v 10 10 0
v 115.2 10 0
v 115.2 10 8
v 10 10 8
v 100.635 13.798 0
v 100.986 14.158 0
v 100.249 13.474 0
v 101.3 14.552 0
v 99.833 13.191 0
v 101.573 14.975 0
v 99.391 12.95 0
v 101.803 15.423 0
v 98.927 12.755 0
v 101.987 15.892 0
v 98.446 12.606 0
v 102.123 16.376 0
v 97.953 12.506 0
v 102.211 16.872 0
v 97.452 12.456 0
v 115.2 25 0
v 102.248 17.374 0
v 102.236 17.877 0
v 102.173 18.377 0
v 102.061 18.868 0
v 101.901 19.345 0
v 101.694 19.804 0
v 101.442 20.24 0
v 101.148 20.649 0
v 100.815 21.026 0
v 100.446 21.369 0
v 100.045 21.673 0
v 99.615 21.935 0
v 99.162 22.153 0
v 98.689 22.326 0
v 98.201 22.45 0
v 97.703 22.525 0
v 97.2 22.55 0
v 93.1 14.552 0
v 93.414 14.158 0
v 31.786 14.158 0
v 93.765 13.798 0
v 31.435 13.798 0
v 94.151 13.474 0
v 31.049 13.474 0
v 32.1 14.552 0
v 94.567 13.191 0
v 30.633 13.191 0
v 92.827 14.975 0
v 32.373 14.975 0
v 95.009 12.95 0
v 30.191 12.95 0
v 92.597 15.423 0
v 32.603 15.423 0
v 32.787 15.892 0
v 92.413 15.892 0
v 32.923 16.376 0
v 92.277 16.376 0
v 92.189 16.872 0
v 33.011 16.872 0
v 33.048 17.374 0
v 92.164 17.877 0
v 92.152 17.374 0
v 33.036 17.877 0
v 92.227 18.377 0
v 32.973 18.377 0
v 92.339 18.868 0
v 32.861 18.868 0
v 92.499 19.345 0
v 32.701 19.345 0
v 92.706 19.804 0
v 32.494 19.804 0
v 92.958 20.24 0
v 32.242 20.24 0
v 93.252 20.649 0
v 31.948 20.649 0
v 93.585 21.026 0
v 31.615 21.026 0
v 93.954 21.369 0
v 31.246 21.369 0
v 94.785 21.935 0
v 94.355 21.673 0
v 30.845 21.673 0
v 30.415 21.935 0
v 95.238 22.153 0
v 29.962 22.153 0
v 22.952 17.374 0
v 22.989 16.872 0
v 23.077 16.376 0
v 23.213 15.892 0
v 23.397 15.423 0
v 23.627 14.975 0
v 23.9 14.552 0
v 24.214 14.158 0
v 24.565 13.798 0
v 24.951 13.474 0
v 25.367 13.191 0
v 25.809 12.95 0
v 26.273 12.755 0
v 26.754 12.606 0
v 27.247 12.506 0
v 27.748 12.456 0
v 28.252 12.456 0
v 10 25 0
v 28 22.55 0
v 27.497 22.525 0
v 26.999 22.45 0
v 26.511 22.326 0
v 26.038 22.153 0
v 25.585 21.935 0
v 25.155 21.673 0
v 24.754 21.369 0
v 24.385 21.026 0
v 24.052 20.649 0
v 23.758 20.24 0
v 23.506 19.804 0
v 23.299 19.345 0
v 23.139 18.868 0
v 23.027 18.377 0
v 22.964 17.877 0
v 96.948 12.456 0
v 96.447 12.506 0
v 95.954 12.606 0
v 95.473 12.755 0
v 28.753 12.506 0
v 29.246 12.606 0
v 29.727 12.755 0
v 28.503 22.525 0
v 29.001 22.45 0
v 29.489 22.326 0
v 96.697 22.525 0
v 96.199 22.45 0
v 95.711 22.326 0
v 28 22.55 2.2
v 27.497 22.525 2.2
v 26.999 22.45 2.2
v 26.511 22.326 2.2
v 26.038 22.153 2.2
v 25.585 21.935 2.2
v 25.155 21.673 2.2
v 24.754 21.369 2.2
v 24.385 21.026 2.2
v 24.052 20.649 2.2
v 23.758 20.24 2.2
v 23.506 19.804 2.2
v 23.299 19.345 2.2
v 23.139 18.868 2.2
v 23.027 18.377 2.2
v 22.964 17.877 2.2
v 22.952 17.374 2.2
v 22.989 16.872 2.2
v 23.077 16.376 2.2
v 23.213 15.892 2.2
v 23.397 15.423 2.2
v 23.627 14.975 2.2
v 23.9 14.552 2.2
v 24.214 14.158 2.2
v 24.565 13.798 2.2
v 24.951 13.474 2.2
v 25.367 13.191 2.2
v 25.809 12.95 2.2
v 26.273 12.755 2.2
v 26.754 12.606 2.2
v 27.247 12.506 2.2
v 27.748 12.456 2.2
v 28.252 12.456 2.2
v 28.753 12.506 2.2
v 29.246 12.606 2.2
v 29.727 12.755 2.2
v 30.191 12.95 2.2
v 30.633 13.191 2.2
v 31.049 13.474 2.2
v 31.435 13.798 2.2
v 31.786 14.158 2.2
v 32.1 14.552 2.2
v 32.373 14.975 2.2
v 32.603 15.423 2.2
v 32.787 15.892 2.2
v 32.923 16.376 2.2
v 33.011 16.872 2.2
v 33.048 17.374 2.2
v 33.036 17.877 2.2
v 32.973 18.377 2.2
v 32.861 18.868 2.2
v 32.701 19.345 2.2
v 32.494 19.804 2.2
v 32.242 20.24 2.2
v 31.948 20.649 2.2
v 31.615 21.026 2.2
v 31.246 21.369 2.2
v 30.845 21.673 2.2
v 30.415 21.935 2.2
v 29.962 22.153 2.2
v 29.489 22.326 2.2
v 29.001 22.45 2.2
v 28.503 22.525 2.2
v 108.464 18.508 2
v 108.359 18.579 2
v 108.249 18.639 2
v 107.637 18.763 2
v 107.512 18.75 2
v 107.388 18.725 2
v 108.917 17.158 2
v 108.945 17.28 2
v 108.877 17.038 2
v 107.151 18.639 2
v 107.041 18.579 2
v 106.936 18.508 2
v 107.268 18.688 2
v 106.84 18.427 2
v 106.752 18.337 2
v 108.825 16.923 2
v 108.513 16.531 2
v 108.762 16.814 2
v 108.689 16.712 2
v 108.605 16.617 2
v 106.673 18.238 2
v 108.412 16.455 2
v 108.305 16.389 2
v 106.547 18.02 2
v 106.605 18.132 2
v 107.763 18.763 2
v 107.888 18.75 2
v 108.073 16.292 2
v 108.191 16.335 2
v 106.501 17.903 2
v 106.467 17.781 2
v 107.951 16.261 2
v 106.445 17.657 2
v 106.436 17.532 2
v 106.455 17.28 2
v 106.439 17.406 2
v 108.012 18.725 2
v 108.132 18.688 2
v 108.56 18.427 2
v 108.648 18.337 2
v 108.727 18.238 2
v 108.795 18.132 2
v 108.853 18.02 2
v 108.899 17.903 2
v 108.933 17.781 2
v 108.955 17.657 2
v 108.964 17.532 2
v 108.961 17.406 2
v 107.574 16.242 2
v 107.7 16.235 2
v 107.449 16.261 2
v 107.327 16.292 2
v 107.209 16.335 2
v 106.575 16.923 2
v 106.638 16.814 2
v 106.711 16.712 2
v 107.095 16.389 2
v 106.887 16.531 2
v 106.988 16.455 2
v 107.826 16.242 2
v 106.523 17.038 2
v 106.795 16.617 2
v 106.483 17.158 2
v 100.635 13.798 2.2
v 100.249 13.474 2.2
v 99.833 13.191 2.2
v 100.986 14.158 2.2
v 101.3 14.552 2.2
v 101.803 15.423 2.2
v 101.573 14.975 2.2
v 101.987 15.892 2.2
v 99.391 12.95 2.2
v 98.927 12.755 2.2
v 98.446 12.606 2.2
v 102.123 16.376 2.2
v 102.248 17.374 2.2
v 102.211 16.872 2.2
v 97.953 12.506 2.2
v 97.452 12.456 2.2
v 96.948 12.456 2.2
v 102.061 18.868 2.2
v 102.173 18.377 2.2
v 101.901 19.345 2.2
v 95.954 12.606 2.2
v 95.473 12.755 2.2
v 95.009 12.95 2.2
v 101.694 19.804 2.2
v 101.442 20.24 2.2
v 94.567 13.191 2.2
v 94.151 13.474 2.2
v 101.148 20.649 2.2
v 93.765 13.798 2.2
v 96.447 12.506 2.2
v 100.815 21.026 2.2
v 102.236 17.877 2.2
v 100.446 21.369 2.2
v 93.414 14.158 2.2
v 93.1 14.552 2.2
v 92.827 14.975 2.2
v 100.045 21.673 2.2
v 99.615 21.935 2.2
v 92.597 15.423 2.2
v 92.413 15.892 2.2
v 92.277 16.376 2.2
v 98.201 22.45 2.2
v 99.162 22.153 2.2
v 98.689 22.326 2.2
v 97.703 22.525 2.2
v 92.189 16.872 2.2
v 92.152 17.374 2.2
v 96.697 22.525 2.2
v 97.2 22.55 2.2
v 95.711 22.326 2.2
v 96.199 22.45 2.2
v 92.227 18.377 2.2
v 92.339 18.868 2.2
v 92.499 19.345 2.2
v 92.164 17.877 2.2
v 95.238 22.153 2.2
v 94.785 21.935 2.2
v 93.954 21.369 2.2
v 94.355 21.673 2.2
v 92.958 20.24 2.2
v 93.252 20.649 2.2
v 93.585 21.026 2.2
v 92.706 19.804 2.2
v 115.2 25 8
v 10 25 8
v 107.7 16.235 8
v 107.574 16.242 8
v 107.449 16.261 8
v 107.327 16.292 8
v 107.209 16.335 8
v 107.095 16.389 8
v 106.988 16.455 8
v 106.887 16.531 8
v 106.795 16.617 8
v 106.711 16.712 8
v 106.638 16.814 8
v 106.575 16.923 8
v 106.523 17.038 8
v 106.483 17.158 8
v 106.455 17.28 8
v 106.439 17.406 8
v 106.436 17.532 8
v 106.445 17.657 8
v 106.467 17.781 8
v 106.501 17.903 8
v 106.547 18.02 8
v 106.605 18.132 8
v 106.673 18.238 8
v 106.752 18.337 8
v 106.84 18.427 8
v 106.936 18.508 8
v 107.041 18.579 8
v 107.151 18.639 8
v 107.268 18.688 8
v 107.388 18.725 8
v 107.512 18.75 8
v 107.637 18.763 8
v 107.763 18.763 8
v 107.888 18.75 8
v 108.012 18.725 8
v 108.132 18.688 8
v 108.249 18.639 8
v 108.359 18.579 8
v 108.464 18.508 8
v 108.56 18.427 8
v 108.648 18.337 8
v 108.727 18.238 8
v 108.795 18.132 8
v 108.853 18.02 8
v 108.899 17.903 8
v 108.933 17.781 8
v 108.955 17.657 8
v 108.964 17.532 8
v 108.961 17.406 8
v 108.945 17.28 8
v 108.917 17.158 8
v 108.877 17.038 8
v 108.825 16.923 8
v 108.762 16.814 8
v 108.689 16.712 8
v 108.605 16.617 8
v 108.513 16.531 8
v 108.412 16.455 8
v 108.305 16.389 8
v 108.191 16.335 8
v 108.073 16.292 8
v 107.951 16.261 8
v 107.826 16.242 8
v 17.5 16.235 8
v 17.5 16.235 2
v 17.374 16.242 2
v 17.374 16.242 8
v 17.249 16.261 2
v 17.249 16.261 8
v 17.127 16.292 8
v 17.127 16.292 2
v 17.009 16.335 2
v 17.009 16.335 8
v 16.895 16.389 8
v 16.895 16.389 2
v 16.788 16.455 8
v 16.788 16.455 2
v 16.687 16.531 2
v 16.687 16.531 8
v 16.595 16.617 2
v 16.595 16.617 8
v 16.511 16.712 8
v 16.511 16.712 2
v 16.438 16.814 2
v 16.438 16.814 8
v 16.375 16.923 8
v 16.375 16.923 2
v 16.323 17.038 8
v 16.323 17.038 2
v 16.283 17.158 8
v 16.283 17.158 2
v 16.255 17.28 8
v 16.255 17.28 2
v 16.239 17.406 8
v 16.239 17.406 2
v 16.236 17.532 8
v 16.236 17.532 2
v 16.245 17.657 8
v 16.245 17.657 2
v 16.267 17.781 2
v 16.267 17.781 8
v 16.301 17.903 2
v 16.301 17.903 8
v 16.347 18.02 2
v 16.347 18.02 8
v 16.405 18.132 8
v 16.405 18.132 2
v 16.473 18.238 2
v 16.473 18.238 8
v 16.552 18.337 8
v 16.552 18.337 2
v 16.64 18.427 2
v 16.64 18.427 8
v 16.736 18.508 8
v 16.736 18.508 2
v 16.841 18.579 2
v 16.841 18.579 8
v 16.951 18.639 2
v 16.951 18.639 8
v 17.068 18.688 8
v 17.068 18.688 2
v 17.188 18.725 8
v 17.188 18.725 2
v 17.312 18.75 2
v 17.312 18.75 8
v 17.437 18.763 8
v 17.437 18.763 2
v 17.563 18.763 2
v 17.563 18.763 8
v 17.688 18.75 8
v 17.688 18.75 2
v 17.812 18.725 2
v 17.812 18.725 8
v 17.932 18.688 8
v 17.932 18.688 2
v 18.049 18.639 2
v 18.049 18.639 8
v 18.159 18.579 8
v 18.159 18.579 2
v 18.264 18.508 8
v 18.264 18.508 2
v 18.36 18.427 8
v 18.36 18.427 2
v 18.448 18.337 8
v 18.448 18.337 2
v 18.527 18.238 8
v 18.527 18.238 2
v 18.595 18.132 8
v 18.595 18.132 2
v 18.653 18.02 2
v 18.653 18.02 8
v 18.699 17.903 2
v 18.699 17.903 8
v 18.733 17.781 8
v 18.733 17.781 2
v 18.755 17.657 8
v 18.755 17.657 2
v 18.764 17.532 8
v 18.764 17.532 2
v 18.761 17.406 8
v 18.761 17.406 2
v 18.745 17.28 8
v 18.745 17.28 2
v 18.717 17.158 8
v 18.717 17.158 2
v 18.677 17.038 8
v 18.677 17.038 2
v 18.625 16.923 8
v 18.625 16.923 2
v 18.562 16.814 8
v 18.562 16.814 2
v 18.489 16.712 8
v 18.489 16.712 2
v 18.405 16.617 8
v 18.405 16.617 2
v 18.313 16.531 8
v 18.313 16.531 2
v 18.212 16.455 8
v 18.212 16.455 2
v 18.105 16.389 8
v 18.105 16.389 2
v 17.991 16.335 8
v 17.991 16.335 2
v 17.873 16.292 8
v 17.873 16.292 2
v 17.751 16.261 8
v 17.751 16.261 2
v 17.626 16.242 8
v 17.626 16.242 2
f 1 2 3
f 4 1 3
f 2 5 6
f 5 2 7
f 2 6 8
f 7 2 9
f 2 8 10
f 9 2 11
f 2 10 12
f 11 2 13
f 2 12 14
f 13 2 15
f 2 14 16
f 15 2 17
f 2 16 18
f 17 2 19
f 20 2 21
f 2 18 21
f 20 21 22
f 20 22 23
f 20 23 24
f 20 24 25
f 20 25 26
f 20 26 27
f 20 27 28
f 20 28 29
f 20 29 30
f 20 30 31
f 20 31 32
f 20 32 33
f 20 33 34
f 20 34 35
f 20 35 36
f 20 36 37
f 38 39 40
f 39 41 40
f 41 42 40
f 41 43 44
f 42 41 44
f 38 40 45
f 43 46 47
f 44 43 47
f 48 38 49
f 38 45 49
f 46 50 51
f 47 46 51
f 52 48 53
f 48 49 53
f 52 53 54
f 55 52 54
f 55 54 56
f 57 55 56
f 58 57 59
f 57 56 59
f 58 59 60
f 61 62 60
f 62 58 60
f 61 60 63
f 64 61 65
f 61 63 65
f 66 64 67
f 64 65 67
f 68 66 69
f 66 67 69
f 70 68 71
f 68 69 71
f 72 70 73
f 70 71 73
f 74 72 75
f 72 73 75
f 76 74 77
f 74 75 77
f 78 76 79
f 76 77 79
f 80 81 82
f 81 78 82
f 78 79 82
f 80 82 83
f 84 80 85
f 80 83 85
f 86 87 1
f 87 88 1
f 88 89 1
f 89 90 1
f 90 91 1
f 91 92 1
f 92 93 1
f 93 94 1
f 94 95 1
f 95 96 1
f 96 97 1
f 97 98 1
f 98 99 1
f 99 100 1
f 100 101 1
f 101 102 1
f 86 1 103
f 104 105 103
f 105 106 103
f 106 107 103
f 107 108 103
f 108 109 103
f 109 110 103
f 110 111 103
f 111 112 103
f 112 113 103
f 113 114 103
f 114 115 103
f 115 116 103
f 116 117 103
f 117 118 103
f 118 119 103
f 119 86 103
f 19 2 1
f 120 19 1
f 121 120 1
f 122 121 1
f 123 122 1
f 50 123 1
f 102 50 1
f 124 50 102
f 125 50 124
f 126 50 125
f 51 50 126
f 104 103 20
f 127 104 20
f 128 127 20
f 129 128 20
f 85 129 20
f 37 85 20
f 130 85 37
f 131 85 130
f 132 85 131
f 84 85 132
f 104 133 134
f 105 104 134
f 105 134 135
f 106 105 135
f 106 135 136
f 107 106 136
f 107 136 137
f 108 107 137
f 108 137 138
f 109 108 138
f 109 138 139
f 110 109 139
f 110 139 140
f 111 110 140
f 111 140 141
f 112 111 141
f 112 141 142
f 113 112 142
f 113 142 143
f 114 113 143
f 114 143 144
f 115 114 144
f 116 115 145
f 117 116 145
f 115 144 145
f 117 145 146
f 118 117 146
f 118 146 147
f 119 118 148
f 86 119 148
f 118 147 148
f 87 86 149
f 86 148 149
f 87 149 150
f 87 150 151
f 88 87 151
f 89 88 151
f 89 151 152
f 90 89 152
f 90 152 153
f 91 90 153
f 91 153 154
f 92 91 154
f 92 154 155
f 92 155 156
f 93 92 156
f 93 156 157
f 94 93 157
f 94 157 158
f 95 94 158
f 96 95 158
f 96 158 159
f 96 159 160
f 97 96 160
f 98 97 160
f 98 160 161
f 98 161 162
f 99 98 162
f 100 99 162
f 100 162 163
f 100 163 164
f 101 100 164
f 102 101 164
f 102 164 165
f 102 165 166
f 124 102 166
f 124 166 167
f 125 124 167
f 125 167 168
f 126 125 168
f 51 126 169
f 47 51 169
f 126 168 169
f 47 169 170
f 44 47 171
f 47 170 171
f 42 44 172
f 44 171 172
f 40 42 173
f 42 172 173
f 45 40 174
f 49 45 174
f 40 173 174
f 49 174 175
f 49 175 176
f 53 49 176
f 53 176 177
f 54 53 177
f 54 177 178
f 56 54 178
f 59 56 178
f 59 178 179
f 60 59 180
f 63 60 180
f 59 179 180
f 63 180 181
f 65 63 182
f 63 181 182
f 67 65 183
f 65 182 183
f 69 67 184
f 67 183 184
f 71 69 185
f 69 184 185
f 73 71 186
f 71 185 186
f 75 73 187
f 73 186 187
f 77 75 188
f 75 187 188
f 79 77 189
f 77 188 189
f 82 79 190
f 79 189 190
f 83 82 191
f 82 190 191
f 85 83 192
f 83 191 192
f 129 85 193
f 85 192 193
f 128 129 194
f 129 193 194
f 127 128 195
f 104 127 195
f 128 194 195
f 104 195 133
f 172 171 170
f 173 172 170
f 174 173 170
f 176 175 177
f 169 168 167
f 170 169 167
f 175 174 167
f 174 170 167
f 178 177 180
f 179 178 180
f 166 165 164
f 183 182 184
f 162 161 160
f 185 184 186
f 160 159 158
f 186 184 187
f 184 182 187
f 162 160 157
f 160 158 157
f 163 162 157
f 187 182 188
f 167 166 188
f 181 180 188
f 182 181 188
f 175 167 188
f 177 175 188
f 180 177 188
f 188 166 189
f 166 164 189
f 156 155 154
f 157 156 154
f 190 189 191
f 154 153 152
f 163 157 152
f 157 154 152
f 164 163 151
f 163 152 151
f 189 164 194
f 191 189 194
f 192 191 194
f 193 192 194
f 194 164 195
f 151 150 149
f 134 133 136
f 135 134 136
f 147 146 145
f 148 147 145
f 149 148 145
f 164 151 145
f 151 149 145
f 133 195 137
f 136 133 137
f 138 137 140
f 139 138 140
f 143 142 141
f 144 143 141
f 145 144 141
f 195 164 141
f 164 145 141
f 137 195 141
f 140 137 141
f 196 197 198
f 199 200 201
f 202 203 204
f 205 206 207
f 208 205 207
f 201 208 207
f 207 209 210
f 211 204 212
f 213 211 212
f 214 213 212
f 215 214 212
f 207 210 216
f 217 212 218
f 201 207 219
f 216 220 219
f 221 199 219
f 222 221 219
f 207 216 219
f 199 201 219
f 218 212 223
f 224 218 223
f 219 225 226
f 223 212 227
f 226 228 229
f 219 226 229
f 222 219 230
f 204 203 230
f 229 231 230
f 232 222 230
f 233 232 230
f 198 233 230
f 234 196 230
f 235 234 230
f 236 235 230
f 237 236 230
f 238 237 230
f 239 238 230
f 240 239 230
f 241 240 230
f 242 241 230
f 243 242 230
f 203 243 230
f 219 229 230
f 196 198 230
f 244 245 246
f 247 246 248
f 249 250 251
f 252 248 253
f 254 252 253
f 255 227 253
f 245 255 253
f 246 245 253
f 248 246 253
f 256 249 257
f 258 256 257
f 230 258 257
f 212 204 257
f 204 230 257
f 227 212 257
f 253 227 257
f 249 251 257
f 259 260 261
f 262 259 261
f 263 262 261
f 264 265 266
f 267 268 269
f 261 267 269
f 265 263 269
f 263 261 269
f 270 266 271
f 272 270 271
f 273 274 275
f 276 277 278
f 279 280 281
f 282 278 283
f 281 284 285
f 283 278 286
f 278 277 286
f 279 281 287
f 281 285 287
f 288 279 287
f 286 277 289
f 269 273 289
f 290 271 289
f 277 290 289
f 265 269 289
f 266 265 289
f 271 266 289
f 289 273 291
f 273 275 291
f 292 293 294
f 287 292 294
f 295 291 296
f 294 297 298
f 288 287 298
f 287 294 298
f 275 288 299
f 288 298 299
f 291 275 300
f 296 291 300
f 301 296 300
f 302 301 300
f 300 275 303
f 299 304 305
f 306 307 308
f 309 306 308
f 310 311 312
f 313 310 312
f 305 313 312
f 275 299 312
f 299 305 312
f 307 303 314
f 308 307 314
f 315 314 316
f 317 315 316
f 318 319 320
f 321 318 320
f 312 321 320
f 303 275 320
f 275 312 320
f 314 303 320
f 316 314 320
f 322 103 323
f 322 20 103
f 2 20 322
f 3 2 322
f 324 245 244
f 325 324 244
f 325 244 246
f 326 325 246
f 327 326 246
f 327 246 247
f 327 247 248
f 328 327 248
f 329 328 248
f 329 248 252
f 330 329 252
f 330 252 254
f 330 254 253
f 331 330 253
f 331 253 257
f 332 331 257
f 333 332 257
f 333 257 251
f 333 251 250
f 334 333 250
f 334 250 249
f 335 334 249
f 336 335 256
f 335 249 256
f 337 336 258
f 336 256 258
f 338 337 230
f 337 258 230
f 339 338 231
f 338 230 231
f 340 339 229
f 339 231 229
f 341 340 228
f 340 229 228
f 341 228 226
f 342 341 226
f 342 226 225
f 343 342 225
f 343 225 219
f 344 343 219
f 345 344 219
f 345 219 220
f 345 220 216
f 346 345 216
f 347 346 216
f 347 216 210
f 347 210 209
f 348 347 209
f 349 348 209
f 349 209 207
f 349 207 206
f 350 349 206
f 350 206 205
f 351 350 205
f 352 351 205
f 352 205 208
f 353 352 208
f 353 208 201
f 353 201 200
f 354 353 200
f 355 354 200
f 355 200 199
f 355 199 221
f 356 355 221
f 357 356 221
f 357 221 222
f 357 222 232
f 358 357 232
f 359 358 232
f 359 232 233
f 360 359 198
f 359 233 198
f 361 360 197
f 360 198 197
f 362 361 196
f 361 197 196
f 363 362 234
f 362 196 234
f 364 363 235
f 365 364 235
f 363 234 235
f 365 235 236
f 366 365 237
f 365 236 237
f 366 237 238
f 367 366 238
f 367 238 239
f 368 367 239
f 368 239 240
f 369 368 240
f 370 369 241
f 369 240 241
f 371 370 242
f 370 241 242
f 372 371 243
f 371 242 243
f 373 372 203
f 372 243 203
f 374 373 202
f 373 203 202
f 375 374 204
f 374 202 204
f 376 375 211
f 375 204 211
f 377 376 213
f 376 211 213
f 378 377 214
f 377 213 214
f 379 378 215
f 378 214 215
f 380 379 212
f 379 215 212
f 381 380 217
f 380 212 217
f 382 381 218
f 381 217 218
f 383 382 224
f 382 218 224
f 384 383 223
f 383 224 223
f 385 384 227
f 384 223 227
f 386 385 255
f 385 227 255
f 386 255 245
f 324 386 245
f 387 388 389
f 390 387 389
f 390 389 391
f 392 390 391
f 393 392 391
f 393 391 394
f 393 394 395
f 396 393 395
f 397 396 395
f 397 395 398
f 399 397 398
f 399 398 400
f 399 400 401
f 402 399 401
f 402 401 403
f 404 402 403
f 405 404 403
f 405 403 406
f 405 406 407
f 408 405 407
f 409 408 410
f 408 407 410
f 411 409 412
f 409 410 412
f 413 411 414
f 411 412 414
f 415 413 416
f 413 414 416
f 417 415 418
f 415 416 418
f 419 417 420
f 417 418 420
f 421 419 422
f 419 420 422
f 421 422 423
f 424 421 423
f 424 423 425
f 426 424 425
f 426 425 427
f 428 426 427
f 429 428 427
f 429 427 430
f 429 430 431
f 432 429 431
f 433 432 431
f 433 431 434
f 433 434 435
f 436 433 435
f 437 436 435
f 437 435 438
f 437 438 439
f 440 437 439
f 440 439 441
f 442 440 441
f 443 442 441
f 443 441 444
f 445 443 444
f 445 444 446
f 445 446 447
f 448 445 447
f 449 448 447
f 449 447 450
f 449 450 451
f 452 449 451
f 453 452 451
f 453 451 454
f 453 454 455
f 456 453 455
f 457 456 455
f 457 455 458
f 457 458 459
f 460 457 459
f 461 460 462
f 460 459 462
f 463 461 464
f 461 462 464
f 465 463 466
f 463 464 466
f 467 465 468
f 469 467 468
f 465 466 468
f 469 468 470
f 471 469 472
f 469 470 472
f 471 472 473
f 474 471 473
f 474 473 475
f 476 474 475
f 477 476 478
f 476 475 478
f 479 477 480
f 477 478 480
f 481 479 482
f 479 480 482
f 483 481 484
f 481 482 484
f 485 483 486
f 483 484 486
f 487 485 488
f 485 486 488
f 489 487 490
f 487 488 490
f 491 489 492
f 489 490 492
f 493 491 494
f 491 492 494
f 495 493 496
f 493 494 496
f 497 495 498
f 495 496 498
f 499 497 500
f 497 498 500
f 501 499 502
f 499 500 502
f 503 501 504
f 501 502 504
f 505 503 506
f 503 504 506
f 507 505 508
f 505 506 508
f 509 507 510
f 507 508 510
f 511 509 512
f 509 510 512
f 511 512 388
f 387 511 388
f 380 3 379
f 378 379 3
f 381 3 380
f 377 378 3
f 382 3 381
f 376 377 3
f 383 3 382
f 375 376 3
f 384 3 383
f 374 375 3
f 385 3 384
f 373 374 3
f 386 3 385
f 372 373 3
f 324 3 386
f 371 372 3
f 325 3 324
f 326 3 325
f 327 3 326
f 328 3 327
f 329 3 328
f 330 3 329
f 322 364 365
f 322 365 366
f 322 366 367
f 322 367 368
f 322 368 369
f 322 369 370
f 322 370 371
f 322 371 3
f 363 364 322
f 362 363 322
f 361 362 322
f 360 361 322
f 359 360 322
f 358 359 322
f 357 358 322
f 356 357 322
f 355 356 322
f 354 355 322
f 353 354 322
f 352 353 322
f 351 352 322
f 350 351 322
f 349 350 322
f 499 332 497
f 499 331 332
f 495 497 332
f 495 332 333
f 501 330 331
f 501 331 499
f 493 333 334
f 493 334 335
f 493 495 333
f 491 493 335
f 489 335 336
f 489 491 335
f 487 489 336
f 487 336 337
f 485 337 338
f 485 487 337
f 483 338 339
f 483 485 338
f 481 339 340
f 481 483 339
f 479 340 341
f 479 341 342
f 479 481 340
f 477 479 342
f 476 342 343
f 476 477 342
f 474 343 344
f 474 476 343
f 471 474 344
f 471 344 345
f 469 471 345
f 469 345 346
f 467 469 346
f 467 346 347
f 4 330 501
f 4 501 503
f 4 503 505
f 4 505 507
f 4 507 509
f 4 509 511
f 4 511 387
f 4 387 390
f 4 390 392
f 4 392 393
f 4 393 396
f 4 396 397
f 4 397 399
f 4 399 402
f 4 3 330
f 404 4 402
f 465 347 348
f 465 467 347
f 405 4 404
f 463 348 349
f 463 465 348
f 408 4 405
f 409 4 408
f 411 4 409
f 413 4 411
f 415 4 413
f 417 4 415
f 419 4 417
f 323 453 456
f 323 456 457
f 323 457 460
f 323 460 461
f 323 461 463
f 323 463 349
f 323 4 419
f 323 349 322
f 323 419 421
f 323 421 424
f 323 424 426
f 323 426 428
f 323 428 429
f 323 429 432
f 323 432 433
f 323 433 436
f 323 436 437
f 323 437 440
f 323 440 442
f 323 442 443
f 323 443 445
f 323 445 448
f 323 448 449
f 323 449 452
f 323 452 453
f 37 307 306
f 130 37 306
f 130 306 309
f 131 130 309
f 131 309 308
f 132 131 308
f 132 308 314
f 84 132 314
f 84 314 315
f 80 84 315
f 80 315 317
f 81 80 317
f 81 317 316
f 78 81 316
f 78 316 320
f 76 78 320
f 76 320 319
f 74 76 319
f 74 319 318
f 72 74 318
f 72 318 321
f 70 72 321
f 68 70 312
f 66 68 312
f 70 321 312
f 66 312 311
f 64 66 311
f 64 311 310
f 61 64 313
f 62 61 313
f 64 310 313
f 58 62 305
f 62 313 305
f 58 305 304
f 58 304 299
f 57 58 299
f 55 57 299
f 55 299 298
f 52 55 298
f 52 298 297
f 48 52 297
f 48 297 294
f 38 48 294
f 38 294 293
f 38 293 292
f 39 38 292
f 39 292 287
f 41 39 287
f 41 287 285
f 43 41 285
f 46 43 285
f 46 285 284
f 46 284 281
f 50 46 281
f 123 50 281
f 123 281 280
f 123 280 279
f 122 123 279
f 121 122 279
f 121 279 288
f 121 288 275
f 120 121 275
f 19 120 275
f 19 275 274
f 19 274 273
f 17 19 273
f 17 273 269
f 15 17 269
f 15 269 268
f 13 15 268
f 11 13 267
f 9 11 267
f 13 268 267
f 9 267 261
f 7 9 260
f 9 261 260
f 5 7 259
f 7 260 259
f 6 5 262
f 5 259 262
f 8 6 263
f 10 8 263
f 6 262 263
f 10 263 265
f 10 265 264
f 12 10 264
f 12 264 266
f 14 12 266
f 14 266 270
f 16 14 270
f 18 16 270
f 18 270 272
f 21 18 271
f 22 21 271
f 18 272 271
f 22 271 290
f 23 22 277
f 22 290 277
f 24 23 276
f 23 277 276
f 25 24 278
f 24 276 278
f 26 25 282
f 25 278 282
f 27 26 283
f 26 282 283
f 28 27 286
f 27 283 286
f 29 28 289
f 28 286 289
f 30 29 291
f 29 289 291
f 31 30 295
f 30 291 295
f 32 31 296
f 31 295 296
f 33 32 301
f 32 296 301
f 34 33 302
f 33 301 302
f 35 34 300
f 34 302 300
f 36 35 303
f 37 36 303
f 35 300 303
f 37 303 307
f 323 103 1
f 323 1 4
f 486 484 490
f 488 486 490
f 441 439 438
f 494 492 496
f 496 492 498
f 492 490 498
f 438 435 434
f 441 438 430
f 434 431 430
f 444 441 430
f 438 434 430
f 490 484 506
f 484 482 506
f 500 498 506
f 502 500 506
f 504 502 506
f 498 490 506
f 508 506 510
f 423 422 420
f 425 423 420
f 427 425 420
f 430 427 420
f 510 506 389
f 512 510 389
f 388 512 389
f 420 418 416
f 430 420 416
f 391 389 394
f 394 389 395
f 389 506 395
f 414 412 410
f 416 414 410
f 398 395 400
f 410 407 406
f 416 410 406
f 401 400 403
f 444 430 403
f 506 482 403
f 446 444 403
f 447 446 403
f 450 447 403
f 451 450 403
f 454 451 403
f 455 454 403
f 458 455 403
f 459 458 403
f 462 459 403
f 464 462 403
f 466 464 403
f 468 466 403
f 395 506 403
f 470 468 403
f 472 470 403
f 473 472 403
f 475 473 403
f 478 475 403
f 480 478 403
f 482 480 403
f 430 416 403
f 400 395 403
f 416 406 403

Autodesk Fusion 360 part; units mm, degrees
box "BoitePrimitive1" add length 15 width 105.2 height 8 placed x (0, 1, 0) y (-1, 0, 0) z (0, 0, 1) at (115.2, 10, 0)
hole "Perçage1" at (17.5, 17.5, 8) direction (0, 0, -1) diameter 2.529 depth 6 tip angle 180
hole "Perçage2" at (107.7, 17.5, 8) direction (0, 0, -1) diameter 2.529 depth 6 tip angle 180
hole "Perçage3" at (28, 17.5, 0) direction (0, 0, 1) diameter 10.1 depth 2.2 tip angle 180
hole "Perçage4" at (97.2, 17.5, 0) direction (0, 0, 1) diameter 10.1 depth 2.2 tip angle 180
